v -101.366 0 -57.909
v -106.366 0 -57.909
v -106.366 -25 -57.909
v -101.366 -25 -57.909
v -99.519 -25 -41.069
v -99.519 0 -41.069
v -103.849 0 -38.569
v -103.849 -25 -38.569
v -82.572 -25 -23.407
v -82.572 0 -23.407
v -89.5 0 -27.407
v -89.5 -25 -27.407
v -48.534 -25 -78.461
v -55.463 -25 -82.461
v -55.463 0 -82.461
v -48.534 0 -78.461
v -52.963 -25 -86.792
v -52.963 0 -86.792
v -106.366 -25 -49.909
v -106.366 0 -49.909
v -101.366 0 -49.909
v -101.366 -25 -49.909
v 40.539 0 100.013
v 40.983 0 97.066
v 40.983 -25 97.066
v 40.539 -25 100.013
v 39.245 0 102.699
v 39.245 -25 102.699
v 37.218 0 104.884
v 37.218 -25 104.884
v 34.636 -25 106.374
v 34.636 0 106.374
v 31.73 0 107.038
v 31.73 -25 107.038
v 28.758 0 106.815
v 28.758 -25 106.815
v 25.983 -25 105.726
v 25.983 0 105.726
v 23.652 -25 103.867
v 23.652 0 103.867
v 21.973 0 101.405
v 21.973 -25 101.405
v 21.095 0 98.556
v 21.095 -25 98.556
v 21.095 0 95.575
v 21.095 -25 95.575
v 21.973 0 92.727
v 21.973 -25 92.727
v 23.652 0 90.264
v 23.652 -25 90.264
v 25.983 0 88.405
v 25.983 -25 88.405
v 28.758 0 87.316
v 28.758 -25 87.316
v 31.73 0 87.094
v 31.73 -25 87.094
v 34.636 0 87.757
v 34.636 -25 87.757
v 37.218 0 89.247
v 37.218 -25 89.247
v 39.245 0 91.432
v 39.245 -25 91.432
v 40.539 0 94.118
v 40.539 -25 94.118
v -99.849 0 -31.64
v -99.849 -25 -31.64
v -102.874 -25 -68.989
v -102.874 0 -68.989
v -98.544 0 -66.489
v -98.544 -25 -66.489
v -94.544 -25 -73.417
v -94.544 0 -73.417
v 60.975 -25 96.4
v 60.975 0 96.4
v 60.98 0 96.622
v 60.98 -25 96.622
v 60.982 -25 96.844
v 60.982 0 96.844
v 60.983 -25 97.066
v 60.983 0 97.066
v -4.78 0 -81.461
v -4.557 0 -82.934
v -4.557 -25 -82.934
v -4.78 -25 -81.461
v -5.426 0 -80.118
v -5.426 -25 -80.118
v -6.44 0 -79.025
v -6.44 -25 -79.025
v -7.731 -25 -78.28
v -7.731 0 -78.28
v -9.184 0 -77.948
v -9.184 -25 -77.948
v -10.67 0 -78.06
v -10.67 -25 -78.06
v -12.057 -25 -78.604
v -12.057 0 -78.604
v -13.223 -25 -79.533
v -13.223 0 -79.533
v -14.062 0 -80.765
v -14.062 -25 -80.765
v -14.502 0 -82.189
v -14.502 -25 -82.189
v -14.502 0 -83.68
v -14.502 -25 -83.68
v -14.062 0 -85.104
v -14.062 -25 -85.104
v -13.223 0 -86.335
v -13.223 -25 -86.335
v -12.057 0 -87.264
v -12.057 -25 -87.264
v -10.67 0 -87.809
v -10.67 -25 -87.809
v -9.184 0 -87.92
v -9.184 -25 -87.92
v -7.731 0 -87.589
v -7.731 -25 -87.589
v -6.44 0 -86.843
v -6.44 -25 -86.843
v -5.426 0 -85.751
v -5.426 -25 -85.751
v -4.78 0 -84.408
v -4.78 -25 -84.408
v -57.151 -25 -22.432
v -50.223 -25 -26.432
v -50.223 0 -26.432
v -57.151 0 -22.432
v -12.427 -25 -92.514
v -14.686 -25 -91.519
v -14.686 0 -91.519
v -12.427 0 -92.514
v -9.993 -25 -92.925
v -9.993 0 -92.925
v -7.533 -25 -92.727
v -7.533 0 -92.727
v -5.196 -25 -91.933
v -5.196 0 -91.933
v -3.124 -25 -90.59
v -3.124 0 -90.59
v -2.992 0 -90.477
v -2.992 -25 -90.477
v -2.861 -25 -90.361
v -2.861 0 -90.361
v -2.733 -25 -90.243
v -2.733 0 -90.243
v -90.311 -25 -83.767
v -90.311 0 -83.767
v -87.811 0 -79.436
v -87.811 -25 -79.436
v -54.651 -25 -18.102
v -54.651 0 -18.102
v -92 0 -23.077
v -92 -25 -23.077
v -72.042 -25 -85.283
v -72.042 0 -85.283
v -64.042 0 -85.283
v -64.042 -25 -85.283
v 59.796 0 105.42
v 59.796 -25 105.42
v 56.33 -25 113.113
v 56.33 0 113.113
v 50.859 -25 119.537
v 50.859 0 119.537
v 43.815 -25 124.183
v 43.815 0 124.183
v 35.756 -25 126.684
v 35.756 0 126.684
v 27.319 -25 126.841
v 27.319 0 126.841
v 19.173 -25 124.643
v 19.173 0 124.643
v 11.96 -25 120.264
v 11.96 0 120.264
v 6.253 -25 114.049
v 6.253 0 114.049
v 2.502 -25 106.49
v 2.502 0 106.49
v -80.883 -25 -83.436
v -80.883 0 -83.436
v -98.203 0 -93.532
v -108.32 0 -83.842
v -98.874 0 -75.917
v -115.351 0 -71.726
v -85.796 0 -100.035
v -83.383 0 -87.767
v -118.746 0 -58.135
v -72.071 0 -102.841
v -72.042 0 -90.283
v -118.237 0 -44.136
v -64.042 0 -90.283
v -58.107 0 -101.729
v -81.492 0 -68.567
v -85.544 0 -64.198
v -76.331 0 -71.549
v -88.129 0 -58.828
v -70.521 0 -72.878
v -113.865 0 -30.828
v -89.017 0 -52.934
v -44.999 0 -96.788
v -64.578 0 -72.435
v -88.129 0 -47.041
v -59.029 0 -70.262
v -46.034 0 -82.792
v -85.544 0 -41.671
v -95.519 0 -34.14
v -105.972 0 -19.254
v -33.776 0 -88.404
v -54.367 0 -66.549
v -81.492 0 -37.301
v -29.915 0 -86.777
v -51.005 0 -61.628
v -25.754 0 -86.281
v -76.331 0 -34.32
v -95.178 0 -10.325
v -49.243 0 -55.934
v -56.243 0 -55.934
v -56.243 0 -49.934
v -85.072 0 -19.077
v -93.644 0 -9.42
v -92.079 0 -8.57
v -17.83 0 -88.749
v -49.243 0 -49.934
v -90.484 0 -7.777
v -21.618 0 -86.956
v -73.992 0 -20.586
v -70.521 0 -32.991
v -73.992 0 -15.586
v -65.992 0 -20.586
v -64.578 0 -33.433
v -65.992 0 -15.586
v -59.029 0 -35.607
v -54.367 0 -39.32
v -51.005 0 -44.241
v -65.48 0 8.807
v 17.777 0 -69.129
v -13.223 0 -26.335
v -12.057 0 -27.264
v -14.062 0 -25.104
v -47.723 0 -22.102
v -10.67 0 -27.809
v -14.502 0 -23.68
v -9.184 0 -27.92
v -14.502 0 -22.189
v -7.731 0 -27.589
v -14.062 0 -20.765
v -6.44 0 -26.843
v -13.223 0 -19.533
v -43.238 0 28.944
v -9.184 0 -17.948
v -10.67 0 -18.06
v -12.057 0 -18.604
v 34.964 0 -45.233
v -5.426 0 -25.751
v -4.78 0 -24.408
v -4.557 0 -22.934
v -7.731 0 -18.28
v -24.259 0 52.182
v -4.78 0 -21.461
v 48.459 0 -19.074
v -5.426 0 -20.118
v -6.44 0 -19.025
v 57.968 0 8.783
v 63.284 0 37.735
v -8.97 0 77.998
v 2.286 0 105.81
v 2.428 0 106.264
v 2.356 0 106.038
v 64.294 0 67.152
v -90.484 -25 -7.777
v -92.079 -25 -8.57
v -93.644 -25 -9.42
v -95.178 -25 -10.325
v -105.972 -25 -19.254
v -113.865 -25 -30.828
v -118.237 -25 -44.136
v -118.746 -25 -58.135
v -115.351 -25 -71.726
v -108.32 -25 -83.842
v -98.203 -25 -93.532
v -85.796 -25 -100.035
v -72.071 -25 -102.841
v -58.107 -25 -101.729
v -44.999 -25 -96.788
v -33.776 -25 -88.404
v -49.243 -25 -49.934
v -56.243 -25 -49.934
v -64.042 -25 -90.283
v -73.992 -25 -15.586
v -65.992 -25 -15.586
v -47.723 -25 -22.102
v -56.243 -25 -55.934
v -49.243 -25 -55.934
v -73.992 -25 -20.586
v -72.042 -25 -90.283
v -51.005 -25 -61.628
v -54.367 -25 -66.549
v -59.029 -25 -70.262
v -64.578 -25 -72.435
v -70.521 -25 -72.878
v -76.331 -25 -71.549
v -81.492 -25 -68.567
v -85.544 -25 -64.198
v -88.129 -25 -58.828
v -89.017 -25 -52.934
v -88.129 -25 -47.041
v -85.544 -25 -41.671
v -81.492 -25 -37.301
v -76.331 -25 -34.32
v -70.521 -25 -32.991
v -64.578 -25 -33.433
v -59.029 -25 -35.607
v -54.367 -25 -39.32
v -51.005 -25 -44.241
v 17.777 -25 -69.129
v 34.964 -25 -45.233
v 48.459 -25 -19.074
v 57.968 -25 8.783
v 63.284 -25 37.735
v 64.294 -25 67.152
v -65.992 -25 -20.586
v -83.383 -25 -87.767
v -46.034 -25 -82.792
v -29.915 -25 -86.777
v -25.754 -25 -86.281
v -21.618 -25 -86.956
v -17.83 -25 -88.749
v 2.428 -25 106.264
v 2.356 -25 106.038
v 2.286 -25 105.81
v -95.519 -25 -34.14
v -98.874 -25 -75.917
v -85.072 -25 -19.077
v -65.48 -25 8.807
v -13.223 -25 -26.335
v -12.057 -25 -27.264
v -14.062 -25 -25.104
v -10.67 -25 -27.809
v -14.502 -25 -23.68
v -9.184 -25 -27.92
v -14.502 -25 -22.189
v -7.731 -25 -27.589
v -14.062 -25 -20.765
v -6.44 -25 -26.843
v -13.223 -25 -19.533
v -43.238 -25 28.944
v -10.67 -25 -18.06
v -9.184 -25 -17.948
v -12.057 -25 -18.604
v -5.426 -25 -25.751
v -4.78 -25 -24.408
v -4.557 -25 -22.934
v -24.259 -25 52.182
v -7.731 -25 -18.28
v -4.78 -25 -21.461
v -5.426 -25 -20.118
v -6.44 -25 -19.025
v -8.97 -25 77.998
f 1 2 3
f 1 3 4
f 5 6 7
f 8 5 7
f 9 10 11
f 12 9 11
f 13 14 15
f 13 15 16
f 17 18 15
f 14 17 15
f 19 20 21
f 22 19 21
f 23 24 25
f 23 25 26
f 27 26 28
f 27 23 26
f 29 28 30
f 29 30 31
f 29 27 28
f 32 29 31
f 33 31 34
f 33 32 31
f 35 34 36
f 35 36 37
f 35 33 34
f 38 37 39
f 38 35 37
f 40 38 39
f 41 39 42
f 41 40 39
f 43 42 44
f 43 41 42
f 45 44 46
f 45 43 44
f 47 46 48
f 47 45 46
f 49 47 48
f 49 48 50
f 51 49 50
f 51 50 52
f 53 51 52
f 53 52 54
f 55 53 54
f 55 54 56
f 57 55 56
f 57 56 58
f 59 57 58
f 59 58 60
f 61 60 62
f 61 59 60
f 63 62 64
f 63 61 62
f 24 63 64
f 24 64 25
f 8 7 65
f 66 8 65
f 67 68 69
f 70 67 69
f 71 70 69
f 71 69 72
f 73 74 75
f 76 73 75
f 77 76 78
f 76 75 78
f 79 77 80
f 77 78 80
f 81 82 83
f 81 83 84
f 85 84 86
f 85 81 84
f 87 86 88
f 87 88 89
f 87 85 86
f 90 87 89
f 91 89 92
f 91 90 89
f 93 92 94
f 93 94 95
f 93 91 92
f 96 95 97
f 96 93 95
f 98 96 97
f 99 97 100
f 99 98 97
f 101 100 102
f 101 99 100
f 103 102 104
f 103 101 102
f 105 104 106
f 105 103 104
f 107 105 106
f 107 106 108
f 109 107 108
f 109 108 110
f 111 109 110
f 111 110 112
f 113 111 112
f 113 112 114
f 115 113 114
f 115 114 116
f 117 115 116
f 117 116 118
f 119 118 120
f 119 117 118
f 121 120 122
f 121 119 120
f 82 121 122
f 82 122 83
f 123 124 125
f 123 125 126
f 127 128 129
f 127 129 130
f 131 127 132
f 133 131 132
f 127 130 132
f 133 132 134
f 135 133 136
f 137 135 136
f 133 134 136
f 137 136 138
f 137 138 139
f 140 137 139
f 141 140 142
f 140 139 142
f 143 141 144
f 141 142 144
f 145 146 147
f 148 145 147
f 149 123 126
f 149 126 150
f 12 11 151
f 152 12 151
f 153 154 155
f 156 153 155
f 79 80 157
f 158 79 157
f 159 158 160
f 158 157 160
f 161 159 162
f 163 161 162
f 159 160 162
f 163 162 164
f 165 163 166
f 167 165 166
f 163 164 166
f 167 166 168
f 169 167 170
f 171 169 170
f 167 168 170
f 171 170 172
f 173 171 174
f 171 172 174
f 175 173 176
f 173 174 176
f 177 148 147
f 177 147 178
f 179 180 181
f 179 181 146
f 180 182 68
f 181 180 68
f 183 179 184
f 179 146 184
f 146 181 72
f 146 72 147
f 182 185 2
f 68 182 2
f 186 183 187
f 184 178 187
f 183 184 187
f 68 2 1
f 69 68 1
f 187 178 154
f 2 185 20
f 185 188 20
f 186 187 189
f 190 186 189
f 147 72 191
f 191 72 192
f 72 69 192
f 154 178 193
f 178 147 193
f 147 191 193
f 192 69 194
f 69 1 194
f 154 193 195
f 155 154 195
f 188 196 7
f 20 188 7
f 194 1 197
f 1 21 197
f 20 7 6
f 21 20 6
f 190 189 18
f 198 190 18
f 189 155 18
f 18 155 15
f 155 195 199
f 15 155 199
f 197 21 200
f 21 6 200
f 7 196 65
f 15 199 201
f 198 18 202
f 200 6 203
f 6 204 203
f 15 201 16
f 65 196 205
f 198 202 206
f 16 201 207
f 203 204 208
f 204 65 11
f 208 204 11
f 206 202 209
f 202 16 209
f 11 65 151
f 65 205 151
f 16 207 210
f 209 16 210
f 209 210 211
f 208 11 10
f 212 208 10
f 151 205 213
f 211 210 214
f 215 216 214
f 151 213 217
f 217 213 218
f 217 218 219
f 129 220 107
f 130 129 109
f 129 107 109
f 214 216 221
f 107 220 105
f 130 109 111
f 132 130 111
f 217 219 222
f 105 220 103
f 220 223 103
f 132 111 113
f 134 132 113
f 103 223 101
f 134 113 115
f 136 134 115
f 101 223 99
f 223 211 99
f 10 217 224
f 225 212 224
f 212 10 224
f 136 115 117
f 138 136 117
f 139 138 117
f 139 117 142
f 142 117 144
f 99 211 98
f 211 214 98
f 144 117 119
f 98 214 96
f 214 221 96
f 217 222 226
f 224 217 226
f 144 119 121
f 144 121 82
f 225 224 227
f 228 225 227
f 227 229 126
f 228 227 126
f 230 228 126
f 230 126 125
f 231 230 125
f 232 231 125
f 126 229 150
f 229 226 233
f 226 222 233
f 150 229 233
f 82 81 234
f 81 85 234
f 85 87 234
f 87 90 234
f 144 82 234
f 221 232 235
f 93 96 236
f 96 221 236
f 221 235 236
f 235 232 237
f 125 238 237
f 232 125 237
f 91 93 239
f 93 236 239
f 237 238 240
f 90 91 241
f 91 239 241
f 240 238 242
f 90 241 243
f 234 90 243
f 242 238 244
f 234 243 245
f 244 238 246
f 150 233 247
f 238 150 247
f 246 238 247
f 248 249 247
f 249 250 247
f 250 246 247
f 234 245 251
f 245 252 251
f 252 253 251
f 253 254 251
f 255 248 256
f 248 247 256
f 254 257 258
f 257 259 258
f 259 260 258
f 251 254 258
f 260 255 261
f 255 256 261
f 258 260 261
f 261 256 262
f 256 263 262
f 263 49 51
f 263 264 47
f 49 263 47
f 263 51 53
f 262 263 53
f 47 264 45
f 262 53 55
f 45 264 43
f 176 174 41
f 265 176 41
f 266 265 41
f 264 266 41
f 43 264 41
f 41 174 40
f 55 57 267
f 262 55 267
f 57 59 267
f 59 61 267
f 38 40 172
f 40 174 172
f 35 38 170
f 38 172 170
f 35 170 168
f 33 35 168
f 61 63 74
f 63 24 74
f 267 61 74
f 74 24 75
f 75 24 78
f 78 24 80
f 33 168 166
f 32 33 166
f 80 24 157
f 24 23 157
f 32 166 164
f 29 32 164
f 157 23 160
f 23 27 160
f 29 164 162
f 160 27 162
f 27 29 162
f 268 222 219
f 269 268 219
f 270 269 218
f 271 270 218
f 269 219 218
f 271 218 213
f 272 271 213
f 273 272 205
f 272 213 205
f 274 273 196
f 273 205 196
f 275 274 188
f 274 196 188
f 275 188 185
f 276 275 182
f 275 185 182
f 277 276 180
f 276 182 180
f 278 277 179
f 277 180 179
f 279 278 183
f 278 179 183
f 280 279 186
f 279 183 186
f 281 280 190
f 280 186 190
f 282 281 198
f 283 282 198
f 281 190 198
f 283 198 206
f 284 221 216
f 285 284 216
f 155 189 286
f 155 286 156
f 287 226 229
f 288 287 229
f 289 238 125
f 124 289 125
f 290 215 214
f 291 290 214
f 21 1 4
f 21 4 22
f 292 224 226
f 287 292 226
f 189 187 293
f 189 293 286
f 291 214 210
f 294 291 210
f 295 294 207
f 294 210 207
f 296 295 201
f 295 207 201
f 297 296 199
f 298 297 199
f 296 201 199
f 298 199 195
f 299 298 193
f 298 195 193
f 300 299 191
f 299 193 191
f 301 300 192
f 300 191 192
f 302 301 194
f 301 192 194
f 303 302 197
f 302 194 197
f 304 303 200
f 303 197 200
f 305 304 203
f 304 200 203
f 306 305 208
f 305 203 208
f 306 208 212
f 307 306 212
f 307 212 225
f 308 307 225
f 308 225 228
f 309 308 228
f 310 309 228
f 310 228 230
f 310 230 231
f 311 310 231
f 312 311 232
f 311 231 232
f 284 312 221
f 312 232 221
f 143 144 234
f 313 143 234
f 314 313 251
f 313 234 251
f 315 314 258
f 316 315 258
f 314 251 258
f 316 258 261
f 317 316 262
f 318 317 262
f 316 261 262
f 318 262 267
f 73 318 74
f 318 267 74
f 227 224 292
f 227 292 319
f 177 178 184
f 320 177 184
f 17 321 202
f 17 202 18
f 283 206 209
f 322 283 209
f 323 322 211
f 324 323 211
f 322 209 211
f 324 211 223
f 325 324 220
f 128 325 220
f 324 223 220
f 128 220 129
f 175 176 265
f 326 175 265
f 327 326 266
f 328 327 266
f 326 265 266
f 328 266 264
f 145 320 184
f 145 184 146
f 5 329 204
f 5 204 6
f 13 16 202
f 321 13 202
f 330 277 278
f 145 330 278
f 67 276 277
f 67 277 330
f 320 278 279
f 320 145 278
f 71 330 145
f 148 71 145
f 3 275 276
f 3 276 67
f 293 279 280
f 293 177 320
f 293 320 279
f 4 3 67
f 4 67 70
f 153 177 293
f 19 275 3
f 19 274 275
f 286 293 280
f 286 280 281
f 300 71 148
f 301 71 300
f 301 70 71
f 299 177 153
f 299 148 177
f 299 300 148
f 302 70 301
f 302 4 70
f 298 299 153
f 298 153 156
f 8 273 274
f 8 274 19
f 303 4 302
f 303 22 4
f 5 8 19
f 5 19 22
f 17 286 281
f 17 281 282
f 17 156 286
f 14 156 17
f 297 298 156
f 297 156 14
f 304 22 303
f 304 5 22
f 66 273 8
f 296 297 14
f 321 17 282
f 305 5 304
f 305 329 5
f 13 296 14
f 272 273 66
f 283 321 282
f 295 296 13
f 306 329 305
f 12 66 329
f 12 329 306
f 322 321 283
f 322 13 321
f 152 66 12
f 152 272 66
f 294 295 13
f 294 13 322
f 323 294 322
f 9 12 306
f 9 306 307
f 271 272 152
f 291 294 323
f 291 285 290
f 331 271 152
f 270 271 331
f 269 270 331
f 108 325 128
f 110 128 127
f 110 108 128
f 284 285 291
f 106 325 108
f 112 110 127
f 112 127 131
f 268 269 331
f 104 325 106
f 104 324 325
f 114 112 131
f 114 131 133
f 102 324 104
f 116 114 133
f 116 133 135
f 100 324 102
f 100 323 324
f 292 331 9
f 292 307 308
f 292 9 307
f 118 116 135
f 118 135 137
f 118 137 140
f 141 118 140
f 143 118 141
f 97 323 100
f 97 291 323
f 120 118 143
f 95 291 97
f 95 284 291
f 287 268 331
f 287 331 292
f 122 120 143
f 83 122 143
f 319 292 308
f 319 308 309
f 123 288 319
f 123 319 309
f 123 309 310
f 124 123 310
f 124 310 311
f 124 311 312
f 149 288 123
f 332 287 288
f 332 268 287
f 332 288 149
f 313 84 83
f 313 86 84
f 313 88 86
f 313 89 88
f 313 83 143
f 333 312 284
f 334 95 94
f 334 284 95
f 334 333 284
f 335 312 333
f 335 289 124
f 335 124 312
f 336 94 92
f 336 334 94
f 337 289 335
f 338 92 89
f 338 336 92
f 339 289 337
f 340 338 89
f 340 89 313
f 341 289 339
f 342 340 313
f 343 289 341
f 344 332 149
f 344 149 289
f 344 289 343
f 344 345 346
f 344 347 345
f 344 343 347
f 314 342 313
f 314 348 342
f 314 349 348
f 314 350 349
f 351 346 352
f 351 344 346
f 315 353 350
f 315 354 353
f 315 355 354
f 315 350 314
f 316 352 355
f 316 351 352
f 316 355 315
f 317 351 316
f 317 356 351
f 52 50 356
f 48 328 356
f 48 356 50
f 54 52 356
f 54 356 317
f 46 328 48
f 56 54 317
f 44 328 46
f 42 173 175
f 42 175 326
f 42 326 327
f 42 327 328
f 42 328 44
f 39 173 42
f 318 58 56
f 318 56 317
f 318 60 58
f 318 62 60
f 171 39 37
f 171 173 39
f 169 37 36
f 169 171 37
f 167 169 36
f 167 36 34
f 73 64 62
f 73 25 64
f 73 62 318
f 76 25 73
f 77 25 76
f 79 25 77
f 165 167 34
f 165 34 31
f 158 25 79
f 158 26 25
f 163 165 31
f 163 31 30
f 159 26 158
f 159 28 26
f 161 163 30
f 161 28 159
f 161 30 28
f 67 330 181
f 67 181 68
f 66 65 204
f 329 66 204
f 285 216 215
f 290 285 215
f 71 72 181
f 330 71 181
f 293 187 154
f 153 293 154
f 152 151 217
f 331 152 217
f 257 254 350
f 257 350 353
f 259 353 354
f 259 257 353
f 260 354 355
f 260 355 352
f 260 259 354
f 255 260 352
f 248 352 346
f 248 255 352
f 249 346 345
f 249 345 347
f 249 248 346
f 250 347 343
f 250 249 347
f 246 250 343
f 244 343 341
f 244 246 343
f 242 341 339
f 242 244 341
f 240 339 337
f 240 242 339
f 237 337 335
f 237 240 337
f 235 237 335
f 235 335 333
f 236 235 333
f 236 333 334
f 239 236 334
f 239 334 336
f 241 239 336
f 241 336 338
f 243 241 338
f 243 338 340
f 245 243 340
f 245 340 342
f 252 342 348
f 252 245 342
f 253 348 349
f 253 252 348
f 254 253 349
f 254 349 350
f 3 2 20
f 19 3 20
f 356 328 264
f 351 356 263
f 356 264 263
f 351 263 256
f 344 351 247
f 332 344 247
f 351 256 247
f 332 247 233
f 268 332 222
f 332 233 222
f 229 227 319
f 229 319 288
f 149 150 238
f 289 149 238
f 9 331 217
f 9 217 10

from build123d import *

# Parameters (mm, degrees)
F0_R     = 10
F0_W     = 5
F0_H     = 8
F0_W_2   = 8
F0_H_2   = 5
F0_R_2   = 5
F1_DEPTH = 25


with BuildPart() as f1:
    # F0 (on Front) → F1 (new body)
    with BuildSketch(Plane.XZ):
        with BuildLine():
            ThreePointArc((60.975433, 96.400047), (60.980972, 96.732847), (60.982819, 97.065687))
            ThreePointArc((60.982819, 97.065687), (35.755982, 126.683535), (2.501691, 106.49041))
            ThreePointArc((2.501691, 106.49041), (2.393928, 106.15023), (2.285558, 105.810243))
            ThreePointArc((2.285558, 105.810243), (4.350114, 83.256305), (21.59361, 68.572833))
            ThreePointArc((21.59361, 68.572833), (48.295056, 72.564944), (60.975433, 96.400047))
        make_face()
        with Locations((30.982819, 97.065687)):
            Circle(F0_R, mode=Mode.SUBTRACT)
        with BuildLine():
            ThreePointArc((2.285558, 105.810243), (2.393928, 106.15023), (2.501691, 106.49041))
            ThreePointArc((2.501691, 106.49041), (2.391602, 106.150969), (2.285558, 105.810243))
        make_face()
        with BuildLine():
            ThreePointArc((-2.732649, -90.243404), (53.726427, -5.320256), (60.975433, 96.400047))
            ThreePointArc((60.975433, 96.400047), (48.295056, 72.564944), (21.59361, 68.572833))
            ThreePointArc((21.59361, 68.572833), (4.350114, 83.256305), (2.285558, 105.810243))
            ThreePointArc((2.285558, 105.810243), (-33.312028, 40.206629), (-90.483698, -7.776936))
            ThreePointArc((-90.483698, -7.776936), (-60.597191, -3.648374), (-33.776396, -17.46479))
            ThreePointArc((-33.776396, -17.46479), (-23.661975, -19.395325), (-14.685962, -14.349569))
            ThreePointArc((-14.685962, -14.349569), (-0.249152, -19.279648), (-7.475156, -32.715124))
            ThreePointArc((-7.475156, -32.715124), (-14.965806, -40.251179), (-25.569357, -40.934313))
            ThreePointArc((-25.569357, -40.934313), (-34.054638, -44.449031), (-37.569357, -52.934313))
            ThreePointArc((-37.569357, -52.934313), (-34.054638, -61.419594), (-25.569357, -64.934313))
            ThreePointArc((-25.569357, -64.934313), (-14.965806, -65.617446), (-7.475156, -73.153501))
            ThreePointArc((-7.475156, -73.153501), (0.078463, -80.260328), (-2.732649, -90.243404))
        make_face()
        with BuildLine():
            ThreePointArc((-3.124438, -90.590489), (-2.92843, -90.417074), (-2.732649, -90.243404))
            ThreePointArc((-2.732649, -90.243404), (0.078463, -80.260328), (-7.475156, -73.153501))
            ThreePointArc((-7.475156, -73.153501), (-14.965806, -65.617446), (-25.569357, -64.934313))
            ThreePointArc((-25.569357, -64.934313), (-34.054638, -61.419594), (-37.569357, -52.934313))
            ThreePointArc((-37.569357, -52.934313), (-34.054638, -44.449031), (-25.569357, -40.934313))
            ThreePointArc((-25.569357, -40.934313), (-14.965806, -40.251179), (-7.475156, -32.715124))
            ThreePointArc((-7.475156, -32.715124), (-0.249152, -19.279648), (-14.685962, -14.349569))
            ThreePointArc((-14.685962, -14.349569), (-23.661975, -19.395325), (-33.776396, -17.46479))
            ThreePointArc((-33.776396, -17.46479), (-60.597191, -3.648374), (-90.483698, -7.776936))
            ThreePointArc((-90.483698, -7.776936), (-92.822542, -9.066422), (-95.178396, -10.324562))
            ThreePointArc((-95.178396, -10.324562), (-108.31989, -83.842194), (-33.776396, -88.403835))
            ThreePointArc((-33.776396, -88.403835), (-23.661975, -86.4733), (-14.685962, -91.519056))
            ThreePointArc((-14.685962, -91.519056), (-8.756822, -92.902215), (-3.124438, -90.590489))
        make_face()
        Polygon((-80.882925, -83.436465), (-83.382925, -87.766593), (-90.311128, -83.766593), (-87.811128, -79.436465), align=None, mode=Mode.SUBTRACT)
        Polygon((-94.544293, -73.41708), (-98.87442, -75.91708), (-102.87442, -68.988877), (-98.544293, -66.488877), align=None, mode=Mode.SUBTRACT)
        with Locations((-103.865692, -53.909354)):
            Rectangle(F0_W, F0_H, mode=Mode.SUBTRACT)
        with Locations((-68.04214, -87.782824)):
            Rectangle(F0_W_2, F0_H_2, mode=Mode.SUBTRACT)
        Polygon((-48.534414, -78.461424), (-46.034414, -82.791551), (-52.962617, -86.791551), (-55.462617, -82.461424), align=None, mode=Mode.SUBTRACT)
        with BuildLine():
            ThreePointArc((-49.243461, -55.934313), (-89.017181, -52.934313), (-49.243461, -49.934313))
            Line((-49.243461, -49.934313), (-56.243461, -49.934313))
            Line((-56.243461, -49.934313), (-56.243461, -55.934313))
            Line((-56.243461, -55.934313), (-49.243461, -55.934313))
        make_face(mode=Mode.SUBTRACT)
        Polygon((-99.519334, -41.068569), (-103.849461, -38.568569), (-99.849461, -31.640366), (-95.519334, -34.140366), align=None, mode=Mode.SUBTRACT)
        Polygon((-89.499949, -27.407201), (-91.999949, -23.077074), (-85.071746, -19.077074), (-82.571746, -23.407201), align=None, mode=Mode.SUBTRACT)
        with Locations((-69.992223, -18.085801)):
            Rectangle(F0_W_2, F0_H_2, mode=Mode.SUBTRACT)
        Polygon((-57.151438, -22.43216), (-54.651438, -18.102033), (-47.723235, -22.102033), (-50.223235, -26.43216), align=None, mode=Mode.SUBTRACT)
        with Locations((-9.557397, -82.934313)):
            Circle(F0_R_2, mode=Mode.SUBTRACT)
        with Locations((-9.557397, -22.934313)):
            Circle(F0_R_2, mode=Mode.SUBTRACT)
        with BuildLine():
            ThreePointArc((-3.124438, -90.590489), (-2.926272, -90.41951), (-2.732649, -90.243404))
            ThreePointArc((-2.732649, -90.243404), (-2.92843, -90.417074), (-3.124438, -90.590489))
        make_face()
        with BuildLine():
            ThreePointArc((-95.178396, -10.324562), (-92.822542, -9.066422), (-90.483698, -7.776936))
            ThreePointArc((-90.483698, -7.776936), (-92.865091, -8.988014), (-95.178396, -10.324562))
        make_face()
    extrude(amount=F1_DEPTH)


solid = f1.part
